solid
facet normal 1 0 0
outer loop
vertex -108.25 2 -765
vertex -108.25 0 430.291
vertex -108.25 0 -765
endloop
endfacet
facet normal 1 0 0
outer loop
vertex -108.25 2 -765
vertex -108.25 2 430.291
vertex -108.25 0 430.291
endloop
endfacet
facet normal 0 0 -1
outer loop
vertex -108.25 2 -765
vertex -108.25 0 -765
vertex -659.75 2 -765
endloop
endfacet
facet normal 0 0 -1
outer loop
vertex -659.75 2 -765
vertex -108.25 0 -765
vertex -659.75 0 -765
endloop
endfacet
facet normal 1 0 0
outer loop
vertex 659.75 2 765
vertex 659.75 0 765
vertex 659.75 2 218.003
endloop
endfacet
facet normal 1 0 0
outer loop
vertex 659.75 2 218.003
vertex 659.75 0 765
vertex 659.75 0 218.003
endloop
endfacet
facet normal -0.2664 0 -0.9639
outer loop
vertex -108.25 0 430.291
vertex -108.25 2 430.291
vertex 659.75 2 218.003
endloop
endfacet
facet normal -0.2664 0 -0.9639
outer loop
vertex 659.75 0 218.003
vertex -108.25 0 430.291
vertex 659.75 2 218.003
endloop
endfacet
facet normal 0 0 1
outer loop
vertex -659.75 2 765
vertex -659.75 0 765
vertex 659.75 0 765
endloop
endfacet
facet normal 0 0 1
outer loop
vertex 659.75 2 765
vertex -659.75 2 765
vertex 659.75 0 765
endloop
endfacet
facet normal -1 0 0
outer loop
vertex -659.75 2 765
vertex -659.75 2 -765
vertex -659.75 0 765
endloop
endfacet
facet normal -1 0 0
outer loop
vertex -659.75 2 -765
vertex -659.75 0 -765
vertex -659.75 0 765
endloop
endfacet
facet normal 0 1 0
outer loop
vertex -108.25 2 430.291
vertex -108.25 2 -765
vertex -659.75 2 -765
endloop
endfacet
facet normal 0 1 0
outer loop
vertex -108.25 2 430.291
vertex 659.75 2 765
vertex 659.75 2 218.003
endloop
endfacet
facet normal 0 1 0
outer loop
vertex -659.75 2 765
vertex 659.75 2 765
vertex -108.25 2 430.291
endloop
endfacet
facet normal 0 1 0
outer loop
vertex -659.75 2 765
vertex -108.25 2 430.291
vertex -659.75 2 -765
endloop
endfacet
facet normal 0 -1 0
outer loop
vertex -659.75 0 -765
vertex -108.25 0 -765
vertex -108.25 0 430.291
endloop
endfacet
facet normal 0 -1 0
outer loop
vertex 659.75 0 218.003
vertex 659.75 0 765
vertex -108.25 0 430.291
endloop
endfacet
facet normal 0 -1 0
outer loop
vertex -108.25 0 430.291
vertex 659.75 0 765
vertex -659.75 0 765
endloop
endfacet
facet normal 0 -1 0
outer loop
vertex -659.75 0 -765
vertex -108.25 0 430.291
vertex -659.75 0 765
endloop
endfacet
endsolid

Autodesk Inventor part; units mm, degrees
ref_plane "YZ Plane" through (0, 0, 0) normal (1, 0, 0) x (0, 1, 0)
ref_plane "XZ Plane" through (0, 0, 0) normal (0, 1, 0) x (-1, 0, 0)
ref_plane "XY Plane" through (0, 0, 0) normal (0, 0, 1) x (1, 0, 0)
sketch "Sketch1" plane through (0, 0, 0) normal (0, 1, 0) x (-1, 0, 0)
  line L0 (659.75, 765) -> (-659.75, 765)
  line L1 (-659.75, 765) -> (-659.75, -765)
  line L2 (-659.75, -765) -> (659.75, -765)
  line L3 (659.75, -765) -> (659.75, 765)
  line L4 (659.75, 765) -> (-659.75, -765) construction
  line L5 (-659.75, 765) -> (659.75, -765) construction
  point P0 (0, 0)
  dimension "d0" = 1319.5
  dimension "d1" = 1530
extrude "Plate1" add sketch "Sketch1" along normal blind 2
sketch "Sketch2" plane through (0, 2, 0) normal (0, 1, 0) x (1, 0, 0)
  line L0 (-108.25, -435) -> (-108.25, 765) projected
  line L1 (-108.25, -430.2912) -> (661.75, -217.4503) projected
  line L2 (659.75, -765) -> (-659.75, -765) projected
  line L3 (659.75, 765) -> (659.75, -765) projected
  line L4 (-659.75, 765) -> (659.75, 765) projected
  line L5 (-659.75, -765) -> (-659.75, 765) projected
  point P0 (0, 0)
  point P1 (659.75, -218.0031)
extrude "Extrusion1" cut sketch "Sketch2" against normal through all contours L0 L4 L3 L1
equation "\"d2\" = Thickness"
equation "\"BendRadius\" = Thickness"
equation "\"BendReliefWidth\" = Thickness"
equation "\"BendReliefDepth\" = 0.5 * Thickness"
equation "\"CornerReliefSize\" = 4 * Thickness"
equation "\"MinimumRemnant\" = 2 * Thickness"
equation "\"TransitionRadius\" = BendRadius"
equation "\"JacobiRadiusSize\" = BendRadius"
equation "\"GapSize\" = Thickness"
equation "\"Thickness\" = 2"
properties part number "Top"
